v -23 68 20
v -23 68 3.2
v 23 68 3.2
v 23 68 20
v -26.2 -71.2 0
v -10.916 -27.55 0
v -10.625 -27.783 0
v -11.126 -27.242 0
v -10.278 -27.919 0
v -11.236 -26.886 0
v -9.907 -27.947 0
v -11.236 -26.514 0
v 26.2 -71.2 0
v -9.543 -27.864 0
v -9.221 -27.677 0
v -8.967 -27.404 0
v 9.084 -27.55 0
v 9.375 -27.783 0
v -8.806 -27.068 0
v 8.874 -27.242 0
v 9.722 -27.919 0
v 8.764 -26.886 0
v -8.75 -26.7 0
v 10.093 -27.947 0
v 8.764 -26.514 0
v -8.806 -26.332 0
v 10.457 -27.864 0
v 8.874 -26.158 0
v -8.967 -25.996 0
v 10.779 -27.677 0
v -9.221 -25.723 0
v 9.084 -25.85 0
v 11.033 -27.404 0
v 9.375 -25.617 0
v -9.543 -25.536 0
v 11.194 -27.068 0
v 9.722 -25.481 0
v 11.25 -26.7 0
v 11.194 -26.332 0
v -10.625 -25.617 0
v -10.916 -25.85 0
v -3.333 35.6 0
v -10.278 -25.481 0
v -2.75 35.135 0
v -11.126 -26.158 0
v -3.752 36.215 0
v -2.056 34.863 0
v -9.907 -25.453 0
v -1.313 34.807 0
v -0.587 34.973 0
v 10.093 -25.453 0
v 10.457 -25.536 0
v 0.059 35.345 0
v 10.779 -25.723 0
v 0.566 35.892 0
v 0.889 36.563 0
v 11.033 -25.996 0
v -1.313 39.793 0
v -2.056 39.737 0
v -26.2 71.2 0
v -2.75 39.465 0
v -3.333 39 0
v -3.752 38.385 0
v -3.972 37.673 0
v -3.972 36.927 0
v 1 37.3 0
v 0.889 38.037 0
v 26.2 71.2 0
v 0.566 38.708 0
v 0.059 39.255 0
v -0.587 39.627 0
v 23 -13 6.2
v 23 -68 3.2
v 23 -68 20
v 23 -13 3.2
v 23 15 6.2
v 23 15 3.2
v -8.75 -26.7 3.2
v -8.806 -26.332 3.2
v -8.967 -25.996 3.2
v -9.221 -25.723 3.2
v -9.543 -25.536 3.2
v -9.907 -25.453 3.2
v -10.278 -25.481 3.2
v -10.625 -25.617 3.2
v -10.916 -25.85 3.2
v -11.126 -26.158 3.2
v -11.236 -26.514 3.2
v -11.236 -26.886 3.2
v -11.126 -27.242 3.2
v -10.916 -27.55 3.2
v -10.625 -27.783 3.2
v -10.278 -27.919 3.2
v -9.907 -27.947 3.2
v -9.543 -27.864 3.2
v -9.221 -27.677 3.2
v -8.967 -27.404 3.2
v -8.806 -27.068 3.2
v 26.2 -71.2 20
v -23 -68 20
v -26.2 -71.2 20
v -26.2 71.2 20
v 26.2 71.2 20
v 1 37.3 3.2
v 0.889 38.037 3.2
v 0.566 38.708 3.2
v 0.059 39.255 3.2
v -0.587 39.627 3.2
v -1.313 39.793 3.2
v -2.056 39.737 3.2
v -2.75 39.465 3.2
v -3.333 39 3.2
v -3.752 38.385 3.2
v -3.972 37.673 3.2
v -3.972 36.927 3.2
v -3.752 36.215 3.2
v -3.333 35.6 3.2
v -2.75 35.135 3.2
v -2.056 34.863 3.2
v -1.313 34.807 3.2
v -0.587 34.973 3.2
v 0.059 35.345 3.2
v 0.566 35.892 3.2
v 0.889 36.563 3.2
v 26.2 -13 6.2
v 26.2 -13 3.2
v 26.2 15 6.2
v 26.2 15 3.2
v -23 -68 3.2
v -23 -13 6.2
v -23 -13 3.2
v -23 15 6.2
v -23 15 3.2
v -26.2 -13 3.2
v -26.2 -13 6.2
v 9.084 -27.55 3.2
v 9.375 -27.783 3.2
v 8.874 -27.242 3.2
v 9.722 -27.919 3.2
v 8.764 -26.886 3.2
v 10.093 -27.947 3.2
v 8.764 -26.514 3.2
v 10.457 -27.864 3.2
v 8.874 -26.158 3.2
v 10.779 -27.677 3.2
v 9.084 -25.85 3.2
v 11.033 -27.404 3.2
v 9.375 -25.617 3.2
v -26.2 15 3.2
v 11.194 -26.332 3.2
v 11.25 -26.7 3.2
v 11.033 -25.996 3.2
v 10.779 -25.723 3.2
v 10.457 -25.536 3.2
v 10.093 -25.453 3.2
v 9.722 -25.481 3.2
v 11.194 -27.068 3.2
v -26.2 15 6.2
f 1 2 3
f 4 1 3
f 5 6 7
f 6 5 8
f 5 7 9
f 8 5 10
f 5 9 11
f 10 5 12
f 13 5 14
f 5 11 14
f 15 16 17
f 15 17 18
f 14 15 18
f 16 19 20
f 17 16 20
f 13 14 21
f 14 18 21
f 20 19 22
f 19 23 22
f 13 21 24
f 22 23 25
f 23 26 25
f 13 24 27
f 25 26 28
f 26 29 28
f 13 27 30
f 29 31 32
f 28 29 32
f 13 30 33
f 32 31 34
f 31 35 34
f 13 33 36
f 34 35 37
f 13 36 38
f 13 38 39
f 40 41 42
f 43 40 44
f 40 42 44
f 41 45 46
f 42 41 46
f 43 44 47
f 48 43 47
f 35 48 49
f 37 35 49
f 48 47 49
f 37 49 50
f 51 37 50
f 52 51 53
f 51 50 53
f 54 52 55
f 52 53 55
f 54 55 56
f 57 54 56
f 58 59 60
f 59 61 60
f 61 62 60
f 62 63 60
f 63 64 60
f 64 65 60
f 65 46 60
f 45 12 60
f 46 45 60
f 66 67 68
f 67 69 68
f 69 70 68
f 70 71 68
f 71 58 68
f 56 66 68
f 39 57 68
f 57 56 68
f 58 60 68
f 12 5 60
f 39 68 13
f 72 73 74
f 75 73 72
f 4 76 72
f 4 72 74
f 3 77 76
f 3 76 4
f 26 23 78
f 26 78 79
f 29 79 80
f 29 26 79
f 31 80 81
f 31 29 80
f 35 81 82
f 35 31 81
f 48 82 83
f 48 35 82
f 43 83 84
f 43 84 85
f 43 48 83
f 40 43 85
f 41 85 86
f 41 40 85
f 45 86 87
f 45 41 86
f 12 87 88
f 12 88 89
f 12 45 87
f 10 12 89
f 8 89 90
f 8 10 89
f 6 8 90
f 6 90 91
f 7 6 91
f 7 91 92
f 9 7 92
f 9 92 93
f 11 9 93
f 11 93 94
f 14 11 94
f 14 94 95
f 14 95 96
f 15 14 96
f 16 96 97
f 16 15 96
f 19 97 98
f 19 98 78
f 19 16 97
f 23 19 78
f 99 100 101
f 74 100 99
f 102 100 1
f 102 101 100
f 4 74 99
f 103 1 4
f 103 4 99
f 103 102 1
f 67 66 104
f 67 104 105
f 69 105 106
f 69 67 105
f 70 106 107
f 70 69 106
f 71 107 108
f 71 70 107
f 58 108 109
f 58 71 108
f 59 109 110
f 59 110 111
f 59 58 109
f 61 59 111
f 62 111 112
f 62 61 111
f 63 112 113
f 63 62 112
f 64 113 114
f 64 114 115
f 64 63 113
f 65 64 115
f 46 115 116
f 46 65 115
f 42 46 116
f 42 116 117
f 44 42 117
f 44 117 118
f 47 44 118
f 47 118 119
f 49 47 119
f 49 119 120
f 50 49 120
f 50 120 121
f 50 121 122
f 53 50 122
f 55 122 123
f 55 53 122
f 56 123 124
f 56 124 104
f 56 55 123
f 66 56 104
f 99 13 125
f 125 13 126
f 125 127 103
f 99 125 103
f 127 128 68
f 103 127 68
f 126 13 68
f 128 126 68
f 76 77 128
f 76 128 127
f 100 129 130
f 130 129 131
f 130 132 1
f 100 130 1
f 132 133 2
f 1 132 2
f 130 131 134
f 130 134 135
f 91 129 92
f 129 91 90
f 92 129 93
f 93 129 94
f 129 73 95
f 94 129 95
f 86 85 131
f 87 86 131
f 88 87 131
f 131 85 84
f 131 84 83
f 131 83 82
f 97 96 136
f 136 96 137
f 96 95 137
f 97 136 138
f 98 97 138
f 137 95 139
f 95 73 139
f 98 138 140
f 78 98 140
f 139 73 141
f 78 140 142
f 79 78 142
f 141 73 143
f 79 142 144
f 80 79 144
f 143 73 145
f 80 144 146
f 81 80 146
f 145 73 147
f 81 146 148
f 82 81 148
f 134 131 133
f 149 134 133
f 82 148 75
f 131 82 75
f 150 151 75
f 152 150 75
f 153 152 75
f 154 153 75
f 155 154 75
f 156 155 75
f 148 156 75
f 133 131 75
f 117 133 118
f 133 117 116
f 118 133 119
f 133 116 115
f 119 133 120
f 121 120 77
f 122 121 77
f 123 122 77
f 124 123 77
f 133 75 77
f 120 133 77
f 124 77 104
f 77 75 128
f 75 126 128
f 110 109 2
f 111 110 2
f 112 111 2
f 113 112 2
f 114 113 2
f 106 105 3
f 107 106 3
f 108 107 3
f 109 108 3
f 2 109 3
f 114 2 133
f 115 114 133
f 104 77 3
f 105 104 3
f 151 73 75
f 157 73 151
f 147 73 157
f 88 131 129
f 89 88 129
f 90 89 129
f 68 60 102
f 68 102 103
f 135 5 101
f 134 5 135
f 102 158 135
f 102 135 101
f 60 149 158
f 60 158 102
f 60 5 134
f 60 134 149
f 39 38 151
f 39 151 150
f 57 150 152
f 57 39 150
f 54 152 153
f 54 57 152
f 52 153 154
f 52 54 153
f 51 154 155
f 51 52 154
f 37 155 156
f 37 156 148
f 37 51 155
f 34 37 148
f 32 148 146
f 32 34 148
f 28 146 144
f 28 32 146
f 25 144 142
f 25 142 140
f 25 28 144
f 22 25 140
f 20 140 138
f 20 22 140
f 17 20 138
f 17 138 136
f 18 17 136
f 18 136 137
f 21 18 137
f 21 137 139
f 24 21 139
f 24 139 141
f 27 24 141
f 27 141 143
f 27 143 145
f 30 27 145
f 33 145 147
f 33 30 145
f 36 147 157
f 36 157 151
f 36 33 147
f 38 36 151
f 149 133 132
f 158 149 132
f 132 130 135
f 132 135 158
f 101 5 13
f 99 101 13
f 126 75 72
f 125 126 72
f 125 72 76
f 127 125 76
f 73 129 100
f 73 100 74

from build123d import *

# Parameters (mm, degrees)
F0_W          = 52.4
F0_H          = 142.4
F0_W_2        = 46
F0_H_2        = 136
F0_R          = 1.25
F0_R_2        = 2.5
F1_DEPTH      = 3.2
F2_DEPTH      = 20
F3_W          = 28
F3_H          = 3
F4_DEPTH      = 3.201
F4_DEPTH_BACK = 49.201


with BuildPart() as f1:
    # F0 (on Top) → F1 (new body)
    with BuildSketch(Plane.XY):
        Rectangle(F0_W, F0_H)
        Rectangle(F0_W_2, F0_H_2, mode=Mode.SUBTRACT)
        Rectangle(F0_W_2, F0_H_2)
        with Locations((-10, -26.7)):
            Circle(F0_R, mode=Mode.SUBTRACT)
        with Locations((10, -26.7)):
            Circle(F0_R, mode=Mode.SUBTRACT)
        with Locations((-1.5, 37.3)):
            Circle(F0_R_2, mode=Mode.SUBTRACT)
    extrude(amount=F1_DEPTH)

    # F0 (on Top) → F2 (join)
    with BuildSketch(Plane.XY):
        Rectangle(F0_W, F0_H)
        Rectangle(F0_W_2, F0_H_2, mode=Mode.SUBTRACT)
    extrude(amount=F2_DEPTH)

    # F3 (on face) → F4 (cut, two sides)
    with BuildSketch(Plane.YZ.offset(-23)) as f4_sk:
        with Locations((1, 4.7)):
            Rectangle(F3_W, F3_H)
    extrude(amount=-F4_DEPTH, mode=Mode.SUBTRACT)
    extrude(f4_sk.sketch, amount=F4_DEPTH_BACK, mode=Mode.SUBTRACT)


solid = f1.part
